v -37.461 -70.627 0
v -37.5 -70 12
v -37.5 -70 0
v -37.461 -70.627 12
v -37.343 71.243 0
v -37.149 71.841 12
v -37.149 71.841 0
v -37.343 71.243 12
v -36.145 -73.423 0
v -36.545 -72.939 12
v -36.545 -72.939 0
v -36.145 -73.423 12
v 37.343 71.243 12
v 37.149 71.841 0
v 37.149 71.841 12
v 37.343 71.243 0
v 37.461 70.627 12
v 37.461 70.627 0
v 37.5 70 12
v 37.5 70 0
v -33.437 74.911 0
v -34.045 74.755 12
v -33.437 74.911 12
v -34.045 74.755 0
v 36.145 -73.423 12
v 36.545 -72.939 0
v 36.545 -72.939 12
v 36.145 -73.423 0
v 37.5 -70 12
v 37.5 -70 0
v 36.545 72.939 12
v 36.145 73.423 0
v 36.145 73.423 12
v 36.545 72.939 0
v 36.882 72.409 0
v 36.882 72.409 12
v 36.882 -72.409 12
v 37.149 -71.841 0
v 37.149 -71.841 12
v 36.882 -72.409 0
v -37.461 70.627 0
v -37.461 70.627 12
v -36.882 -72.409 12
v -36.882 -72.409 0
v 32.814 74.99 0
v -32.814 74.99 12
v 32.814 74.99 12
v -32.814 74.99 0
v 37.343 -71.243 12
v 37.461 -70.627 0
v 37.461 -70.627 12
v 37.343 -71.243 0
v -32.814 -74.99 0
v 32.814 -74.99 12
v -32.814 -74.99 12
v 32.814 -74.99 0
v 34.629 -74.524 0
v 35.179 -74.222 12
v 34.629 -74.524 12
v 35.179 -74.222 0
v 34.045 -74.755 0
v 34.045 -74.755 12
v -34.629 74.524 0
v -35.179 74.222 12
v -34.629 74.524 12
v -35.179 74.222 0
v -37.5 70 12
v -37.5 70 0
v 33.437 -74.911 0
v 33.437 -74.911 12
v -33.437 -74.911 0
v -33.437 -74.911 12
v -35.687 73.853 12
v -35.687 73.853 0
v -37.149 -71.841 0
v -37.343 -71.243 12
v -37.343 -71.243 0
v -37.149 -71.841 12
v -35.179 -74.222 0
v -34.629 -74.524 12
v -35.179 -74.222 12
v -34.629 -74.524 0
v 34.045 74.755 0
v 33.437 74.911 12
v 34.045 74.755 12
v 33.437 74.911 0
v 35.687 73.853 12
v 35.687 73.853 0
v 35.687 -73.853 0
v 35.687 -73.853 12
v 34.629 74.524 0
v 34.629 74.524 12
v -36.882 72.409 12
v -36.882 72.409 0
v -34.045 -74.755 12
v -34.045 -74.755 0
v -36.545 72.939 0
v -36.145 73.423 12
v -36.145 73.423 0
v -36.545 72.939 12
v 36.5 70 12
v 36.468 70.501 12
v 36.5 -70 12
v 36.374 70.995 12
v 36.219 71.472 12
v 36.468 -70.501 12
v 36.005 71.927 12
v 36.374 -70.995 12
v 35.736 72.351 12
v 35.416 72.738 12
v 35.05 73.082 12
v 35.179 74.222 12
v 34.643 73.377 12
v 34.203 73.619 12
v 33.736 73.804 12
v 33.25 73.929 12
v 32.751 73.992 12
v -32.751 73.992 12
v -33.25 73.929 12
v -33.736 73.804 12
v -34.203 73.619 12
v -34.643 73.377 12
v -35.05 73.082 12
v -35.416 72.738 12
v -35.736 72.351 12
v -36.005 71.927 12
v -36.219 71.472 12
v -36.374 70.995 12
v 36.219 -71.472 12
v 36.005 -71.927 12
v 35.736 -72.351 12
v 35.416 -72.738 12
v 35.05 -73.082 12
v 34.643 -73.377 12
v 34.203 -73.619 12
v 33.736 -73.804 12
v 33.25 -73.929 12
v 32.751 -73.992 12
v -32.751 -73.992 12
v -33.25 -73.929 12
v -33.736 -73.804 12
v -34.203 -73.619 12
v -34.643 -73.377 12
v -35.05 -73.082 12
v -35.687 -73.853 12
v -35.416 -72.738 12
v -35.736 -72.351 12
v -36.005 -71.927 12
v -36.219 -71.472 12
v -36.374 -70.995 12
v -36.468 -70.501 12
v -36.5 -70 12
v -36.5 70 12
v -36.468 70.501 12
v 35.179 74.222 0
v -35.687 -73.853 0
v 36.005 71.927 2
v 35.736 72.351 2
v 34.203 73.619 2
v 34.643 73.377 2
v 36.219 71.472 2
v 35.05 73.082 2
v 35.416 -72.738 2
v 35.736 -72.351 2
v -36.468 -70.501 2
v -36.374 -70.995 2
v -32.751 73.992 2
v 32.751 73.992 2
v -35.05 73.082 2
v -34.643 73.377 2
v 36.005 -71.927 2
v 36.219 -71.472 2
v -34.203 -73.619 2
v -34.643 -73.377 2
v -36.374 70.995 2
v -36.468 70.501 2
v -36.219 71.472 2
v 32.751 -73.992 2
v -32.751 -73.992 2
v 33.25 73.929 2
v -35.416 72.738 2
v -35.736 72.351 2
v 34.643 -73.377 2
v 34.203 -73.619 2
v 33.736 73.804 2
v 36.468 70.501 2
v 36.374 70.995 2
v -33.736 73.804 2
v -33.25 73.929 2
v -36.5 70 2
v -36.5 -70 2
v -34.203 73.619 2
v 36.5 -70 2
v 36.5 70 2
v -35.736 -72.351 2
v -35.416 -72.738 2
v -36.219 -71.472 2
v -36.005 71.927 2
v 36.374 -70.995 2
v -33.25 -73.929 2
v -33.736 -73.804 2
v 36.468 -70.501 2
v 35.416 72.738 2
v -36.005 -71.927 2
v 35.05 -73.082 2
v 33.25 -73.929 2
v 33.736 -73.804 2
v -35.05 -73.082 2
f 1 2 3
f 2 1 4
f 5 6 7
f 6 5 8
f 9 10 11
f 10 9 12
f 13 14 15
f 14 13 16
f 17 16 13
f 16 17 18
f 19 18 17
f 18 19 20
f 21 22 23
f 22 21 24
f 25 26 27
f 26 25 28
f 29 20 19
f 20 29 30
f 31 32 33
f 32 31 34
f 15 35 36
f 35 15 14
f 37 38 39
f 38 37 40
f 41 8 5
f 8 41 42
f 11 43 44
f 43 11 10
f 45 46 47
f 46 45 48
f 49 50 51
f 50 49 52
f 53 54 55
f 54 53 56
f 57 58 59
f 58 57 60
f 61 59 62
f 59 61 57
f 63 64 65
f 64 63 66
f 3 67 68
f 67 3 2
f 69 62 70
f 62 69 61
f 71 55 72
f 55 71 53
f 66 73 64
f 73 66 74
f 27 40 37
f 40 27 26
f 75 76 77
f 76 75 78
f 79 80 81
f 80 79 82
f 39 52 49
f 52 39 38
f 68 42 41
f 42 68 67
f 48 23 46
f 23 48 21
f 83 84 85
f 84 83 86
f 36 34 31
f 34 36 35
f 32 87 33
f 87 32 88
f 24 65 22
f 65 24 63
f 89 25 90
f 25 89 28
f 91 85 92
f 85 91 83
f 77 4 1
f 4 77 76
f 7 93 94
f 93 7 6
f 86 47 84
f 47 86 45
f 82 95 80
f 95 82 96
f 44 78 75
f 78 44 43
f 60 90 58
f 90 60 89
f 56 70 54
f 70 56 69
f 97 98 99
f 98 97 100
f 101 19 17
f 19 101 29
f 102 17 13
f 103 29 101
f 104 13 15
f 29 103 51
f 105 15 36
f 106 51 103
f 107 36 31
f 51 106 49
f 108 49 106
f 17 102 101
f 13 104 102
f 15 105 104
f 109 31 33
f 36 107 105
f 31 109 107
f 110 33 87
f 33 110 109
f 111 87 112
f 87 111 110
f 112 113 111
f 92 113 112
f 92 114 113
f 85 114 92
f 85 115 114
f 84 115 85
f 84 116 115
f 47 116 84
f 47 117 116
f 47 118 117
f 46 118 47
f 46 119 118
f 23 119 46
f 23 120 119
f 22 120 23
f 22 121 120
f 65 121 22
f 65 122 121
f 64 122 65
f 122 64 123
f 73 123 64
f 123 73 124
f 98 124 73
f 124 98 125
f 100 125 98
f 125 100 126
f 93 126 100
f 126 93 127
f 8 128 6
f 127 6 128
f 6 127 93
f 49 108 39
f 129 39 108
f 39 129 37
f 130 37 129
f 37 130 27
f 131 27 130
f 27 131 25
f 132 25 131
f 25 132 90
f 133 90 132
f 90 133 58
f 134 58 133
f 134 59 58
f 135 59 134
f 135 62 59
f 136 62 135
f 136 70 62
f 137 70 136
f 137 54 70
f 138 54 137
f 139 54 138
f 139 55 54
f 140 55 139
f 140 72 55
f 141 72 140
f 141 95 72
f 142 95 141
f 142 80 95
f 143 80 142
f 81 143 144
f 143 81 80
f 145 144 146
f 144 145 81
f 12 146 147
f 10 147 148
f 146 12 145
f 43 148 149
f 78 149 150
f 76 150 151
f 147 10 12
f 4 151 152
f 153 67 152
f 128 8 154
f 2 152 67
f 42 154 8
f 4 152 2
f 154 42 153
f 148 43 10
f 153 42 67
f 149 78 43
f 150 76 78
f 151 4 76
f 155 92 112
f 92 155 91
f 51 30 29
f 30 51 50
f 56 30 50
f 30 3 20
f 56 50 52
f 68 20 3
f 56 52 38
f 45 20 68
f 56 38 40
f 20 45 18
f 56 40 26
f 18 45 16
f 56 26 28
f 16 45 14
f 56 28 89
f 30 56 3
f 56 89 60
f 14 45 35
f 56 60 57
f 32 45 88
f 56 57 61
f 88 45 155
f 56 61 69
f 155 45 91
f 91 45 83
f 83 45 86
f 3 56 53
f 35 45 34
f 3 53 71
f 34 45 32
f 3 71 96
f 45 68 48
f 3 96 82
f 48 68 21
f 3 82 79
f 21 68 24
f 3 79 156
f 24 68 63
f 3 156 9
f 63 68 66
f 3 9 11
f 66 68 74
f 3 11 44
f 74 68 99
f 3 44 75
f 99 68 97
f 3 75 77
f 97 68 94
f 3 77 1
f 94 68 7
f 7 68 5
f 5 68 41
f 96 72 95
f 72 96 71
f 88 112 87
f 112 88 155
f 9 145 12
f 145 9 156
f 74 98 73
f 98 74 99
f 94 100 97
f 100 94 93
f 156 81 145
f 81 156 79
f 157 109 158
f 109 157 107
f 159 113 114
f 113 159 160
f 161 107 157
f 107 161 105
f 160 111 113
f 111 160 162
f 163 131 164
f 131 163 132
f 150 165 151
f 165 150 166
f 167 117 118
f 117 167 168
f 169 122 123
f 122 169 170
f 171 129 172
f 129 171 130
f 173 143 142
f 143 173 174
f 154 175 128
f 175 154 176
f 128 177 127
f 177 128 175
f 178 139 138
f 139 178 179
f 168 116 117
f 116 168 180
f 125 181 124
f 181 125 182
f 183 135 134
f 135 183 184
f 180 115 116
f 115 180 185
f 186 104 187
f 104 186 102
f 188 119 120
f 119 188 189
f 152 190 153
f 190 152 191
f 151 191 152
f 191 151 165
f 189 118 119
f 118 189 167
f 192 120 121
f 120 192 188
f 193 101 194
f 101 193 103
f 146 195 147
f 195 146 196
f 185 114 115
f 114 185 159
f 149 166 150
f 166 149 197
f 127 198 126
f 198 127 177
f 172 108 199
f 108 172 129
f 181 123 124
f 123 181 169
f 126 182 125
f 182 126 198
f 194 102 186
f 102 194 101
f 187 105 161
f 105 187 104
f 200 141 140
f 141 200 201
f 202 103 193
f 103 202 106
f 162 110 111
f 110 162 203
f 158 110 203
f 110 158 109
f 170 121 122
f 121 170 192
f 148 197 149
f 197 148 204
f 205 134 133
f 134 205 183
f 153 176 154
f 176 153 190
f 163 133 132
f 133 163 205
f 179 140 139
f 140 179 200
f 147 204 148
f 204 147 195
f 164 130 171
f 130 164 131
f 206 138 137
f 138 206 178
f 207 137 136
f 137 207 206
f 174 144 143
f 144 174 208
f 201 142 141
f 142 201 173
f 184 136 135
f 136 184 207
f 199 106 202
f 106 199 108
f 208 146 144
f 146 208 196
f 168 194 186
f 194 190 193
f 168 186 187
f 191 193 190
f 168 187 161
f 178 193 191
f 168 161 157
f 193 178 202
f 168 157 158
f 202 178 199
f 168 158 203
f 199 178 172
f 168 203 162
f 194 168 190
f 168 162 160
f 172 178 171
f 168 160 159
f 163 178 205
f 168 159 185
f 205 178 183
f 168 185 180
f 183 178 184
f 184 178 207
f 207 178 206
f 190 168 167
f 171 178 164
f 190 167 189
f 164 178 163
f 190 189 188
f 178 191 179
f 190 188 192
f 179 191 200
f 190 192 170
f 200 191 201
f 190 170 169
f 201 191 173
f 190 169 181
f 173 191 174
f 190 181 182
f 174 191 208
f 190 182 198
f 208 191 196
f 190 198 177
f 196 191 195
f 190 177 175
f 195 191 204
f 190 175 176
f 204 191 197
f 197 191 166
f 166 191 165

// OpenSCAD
$fn = 50;


difference() {
	union() {
		hull() {
			translate(v = [-32.5000000000, 70.0000000000, 0]) {
				cylinder(h = 12, r = 5);
			}
			translate(v = [32.5000000000, 70.0000000000, 0]) {
				cylinder(h = 12, r = 5);
			}
			translate(v = [-32.5000000000, -70.0000000000, 0]) {
				cylinder(h = 12, r = 5);
			}
			translate(v = [32.5000000000, -70.0000000000, 0]) {
				cylinder(h = 12, r = 5);
			}
		}
	}
	union() {
		translate(v = [0, 0, 2]) {
			hull() {
				translate(v = [-32.5000000000, 70.0000000000, 0]) {
					cylinder(h = 10, r = 4);
				}
				translate(v = [32.5000000000, 70.0000000000, 0]) {
					cylinder(h = 10, r = 4);
				}
				translate(v = [-32.5000000000, -70.0000000000, 0]) {
					cylinder(h = 10, r = 4);
				}
				translate(v = [32.5000000000, -70.0000000000, 0]) {
					cylinder(h = 10, r = 4);
				}
			}
		}
	}
}
